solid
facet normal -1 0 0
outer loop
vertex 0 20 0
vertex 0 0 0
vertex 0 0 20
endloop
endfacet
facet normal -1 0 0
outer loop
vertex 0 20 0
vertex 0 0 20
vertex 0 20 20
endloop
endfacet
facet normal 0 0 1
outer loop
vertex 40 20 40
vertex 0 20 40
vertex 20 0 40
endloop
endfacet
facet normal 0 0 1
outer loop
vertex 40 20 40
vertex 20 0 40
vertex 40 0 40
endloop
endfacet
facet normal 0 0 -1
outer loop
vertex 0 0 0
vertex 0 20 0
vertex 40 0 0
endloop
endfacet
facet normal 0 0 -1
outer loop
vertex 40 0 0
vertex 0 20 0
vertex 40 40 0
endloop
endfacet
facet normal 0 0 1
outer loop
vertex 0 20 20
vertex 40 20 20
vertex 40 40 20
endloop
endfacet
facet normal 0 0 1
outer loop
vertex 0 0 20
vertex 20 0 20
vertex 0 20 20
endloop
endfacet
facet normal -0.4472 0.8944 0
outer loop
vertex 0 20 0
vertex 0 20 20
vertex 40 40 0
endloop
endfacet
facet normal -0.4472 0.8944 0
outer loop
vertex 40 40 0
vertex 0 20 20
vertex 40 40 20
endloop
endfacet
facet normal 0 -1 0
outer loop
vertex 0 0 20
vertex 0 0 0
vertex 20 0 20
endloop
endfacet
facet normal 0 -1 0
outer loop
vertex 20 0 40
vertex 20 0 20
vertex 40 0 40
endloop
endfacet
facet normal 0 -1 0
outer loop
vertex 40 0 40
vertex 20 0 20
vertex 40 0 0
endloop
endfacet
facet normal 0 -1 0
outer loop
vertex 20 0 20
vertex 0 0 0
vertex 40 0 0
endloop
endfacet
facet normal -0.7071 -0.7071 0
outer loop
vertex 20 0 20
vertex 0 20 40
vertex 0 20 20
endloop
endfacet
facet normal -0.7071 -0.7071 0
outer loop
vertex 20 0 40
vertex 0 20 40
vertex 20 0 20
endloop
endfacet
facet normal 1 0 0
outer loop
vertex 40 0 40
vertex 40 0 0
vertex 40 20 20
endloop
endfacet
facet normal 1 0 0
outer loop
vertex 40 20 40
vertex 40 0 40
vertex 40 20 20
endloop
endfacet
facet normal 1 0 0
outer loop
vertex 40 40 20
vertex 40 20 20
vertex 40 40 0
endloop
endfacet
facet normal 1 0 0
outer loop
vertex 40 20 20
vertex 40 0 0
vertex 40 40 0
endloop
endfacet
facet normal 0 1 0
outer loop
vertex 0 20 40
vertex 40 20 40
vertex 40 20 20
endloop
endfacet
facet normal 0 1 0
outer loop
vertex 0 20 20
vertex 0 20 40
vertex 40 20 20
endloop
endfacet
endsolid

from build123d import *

# Parameters (mm, degrees)
SKETCH1_W           = 40
SKETCH1_H           = 40
BOSS_EXTRUDE1_DEPTH = 40
CUT_EXTRUDE1_DEPTH  = 40
SKETCH3_W           = 20
SKETCH3_H           = 20
CUT_EXTRUDE2_DEPTH  = 40
CUT_EXTRUDE4_DEPTH  = 20


with BuildPart() as part:
    # Sketch1 → Boss-Extrude1 (new body)
    with BuildSketch(Plane.XY):
        with Locations((20, 20)):
            Rectangle(SKETCH1_W, SKETCH1_H)
    extrude(amount=BOSS_EXTRUDE1_DEPTH)

    # Sketch2 → Cut-Extrude1 (cut)
    with BuildSketch(Plane.XY.offset(40)):
        Polygon((40, 40), (0, 40), (0, 20), align=None)
    extrude(amount=-CUT_EXTRUDE1_DEPTH, mode=Mode.SUBTRACT)

    # Sketch3 → Cut-Extrude2 (cut)
    with BuildSketch(Plane(origin=(40, 0, 0), x_dir=(0, 0, -1), z_dir=(1, 0, 0))):
        with Locations((-30, 30)):
            Rectangle(SKETCH3_W, SKETCH3_H)
    extrude(amount=-CUT_EXTRUDE2_DEPTH, mode=Mode.SUBTRACT)

    # Sketch4 → Cut-Extrude4 (cut)
    with BuildSketch(Plane.XY.offset(40)):
        Polygon((0, 20), (20, 0), (0, 0), align=None)
    extrude(amount=-CUT_EXTRUDE4_DEPTH, mode=Mode.SUBTRACT)


solid = part.part
